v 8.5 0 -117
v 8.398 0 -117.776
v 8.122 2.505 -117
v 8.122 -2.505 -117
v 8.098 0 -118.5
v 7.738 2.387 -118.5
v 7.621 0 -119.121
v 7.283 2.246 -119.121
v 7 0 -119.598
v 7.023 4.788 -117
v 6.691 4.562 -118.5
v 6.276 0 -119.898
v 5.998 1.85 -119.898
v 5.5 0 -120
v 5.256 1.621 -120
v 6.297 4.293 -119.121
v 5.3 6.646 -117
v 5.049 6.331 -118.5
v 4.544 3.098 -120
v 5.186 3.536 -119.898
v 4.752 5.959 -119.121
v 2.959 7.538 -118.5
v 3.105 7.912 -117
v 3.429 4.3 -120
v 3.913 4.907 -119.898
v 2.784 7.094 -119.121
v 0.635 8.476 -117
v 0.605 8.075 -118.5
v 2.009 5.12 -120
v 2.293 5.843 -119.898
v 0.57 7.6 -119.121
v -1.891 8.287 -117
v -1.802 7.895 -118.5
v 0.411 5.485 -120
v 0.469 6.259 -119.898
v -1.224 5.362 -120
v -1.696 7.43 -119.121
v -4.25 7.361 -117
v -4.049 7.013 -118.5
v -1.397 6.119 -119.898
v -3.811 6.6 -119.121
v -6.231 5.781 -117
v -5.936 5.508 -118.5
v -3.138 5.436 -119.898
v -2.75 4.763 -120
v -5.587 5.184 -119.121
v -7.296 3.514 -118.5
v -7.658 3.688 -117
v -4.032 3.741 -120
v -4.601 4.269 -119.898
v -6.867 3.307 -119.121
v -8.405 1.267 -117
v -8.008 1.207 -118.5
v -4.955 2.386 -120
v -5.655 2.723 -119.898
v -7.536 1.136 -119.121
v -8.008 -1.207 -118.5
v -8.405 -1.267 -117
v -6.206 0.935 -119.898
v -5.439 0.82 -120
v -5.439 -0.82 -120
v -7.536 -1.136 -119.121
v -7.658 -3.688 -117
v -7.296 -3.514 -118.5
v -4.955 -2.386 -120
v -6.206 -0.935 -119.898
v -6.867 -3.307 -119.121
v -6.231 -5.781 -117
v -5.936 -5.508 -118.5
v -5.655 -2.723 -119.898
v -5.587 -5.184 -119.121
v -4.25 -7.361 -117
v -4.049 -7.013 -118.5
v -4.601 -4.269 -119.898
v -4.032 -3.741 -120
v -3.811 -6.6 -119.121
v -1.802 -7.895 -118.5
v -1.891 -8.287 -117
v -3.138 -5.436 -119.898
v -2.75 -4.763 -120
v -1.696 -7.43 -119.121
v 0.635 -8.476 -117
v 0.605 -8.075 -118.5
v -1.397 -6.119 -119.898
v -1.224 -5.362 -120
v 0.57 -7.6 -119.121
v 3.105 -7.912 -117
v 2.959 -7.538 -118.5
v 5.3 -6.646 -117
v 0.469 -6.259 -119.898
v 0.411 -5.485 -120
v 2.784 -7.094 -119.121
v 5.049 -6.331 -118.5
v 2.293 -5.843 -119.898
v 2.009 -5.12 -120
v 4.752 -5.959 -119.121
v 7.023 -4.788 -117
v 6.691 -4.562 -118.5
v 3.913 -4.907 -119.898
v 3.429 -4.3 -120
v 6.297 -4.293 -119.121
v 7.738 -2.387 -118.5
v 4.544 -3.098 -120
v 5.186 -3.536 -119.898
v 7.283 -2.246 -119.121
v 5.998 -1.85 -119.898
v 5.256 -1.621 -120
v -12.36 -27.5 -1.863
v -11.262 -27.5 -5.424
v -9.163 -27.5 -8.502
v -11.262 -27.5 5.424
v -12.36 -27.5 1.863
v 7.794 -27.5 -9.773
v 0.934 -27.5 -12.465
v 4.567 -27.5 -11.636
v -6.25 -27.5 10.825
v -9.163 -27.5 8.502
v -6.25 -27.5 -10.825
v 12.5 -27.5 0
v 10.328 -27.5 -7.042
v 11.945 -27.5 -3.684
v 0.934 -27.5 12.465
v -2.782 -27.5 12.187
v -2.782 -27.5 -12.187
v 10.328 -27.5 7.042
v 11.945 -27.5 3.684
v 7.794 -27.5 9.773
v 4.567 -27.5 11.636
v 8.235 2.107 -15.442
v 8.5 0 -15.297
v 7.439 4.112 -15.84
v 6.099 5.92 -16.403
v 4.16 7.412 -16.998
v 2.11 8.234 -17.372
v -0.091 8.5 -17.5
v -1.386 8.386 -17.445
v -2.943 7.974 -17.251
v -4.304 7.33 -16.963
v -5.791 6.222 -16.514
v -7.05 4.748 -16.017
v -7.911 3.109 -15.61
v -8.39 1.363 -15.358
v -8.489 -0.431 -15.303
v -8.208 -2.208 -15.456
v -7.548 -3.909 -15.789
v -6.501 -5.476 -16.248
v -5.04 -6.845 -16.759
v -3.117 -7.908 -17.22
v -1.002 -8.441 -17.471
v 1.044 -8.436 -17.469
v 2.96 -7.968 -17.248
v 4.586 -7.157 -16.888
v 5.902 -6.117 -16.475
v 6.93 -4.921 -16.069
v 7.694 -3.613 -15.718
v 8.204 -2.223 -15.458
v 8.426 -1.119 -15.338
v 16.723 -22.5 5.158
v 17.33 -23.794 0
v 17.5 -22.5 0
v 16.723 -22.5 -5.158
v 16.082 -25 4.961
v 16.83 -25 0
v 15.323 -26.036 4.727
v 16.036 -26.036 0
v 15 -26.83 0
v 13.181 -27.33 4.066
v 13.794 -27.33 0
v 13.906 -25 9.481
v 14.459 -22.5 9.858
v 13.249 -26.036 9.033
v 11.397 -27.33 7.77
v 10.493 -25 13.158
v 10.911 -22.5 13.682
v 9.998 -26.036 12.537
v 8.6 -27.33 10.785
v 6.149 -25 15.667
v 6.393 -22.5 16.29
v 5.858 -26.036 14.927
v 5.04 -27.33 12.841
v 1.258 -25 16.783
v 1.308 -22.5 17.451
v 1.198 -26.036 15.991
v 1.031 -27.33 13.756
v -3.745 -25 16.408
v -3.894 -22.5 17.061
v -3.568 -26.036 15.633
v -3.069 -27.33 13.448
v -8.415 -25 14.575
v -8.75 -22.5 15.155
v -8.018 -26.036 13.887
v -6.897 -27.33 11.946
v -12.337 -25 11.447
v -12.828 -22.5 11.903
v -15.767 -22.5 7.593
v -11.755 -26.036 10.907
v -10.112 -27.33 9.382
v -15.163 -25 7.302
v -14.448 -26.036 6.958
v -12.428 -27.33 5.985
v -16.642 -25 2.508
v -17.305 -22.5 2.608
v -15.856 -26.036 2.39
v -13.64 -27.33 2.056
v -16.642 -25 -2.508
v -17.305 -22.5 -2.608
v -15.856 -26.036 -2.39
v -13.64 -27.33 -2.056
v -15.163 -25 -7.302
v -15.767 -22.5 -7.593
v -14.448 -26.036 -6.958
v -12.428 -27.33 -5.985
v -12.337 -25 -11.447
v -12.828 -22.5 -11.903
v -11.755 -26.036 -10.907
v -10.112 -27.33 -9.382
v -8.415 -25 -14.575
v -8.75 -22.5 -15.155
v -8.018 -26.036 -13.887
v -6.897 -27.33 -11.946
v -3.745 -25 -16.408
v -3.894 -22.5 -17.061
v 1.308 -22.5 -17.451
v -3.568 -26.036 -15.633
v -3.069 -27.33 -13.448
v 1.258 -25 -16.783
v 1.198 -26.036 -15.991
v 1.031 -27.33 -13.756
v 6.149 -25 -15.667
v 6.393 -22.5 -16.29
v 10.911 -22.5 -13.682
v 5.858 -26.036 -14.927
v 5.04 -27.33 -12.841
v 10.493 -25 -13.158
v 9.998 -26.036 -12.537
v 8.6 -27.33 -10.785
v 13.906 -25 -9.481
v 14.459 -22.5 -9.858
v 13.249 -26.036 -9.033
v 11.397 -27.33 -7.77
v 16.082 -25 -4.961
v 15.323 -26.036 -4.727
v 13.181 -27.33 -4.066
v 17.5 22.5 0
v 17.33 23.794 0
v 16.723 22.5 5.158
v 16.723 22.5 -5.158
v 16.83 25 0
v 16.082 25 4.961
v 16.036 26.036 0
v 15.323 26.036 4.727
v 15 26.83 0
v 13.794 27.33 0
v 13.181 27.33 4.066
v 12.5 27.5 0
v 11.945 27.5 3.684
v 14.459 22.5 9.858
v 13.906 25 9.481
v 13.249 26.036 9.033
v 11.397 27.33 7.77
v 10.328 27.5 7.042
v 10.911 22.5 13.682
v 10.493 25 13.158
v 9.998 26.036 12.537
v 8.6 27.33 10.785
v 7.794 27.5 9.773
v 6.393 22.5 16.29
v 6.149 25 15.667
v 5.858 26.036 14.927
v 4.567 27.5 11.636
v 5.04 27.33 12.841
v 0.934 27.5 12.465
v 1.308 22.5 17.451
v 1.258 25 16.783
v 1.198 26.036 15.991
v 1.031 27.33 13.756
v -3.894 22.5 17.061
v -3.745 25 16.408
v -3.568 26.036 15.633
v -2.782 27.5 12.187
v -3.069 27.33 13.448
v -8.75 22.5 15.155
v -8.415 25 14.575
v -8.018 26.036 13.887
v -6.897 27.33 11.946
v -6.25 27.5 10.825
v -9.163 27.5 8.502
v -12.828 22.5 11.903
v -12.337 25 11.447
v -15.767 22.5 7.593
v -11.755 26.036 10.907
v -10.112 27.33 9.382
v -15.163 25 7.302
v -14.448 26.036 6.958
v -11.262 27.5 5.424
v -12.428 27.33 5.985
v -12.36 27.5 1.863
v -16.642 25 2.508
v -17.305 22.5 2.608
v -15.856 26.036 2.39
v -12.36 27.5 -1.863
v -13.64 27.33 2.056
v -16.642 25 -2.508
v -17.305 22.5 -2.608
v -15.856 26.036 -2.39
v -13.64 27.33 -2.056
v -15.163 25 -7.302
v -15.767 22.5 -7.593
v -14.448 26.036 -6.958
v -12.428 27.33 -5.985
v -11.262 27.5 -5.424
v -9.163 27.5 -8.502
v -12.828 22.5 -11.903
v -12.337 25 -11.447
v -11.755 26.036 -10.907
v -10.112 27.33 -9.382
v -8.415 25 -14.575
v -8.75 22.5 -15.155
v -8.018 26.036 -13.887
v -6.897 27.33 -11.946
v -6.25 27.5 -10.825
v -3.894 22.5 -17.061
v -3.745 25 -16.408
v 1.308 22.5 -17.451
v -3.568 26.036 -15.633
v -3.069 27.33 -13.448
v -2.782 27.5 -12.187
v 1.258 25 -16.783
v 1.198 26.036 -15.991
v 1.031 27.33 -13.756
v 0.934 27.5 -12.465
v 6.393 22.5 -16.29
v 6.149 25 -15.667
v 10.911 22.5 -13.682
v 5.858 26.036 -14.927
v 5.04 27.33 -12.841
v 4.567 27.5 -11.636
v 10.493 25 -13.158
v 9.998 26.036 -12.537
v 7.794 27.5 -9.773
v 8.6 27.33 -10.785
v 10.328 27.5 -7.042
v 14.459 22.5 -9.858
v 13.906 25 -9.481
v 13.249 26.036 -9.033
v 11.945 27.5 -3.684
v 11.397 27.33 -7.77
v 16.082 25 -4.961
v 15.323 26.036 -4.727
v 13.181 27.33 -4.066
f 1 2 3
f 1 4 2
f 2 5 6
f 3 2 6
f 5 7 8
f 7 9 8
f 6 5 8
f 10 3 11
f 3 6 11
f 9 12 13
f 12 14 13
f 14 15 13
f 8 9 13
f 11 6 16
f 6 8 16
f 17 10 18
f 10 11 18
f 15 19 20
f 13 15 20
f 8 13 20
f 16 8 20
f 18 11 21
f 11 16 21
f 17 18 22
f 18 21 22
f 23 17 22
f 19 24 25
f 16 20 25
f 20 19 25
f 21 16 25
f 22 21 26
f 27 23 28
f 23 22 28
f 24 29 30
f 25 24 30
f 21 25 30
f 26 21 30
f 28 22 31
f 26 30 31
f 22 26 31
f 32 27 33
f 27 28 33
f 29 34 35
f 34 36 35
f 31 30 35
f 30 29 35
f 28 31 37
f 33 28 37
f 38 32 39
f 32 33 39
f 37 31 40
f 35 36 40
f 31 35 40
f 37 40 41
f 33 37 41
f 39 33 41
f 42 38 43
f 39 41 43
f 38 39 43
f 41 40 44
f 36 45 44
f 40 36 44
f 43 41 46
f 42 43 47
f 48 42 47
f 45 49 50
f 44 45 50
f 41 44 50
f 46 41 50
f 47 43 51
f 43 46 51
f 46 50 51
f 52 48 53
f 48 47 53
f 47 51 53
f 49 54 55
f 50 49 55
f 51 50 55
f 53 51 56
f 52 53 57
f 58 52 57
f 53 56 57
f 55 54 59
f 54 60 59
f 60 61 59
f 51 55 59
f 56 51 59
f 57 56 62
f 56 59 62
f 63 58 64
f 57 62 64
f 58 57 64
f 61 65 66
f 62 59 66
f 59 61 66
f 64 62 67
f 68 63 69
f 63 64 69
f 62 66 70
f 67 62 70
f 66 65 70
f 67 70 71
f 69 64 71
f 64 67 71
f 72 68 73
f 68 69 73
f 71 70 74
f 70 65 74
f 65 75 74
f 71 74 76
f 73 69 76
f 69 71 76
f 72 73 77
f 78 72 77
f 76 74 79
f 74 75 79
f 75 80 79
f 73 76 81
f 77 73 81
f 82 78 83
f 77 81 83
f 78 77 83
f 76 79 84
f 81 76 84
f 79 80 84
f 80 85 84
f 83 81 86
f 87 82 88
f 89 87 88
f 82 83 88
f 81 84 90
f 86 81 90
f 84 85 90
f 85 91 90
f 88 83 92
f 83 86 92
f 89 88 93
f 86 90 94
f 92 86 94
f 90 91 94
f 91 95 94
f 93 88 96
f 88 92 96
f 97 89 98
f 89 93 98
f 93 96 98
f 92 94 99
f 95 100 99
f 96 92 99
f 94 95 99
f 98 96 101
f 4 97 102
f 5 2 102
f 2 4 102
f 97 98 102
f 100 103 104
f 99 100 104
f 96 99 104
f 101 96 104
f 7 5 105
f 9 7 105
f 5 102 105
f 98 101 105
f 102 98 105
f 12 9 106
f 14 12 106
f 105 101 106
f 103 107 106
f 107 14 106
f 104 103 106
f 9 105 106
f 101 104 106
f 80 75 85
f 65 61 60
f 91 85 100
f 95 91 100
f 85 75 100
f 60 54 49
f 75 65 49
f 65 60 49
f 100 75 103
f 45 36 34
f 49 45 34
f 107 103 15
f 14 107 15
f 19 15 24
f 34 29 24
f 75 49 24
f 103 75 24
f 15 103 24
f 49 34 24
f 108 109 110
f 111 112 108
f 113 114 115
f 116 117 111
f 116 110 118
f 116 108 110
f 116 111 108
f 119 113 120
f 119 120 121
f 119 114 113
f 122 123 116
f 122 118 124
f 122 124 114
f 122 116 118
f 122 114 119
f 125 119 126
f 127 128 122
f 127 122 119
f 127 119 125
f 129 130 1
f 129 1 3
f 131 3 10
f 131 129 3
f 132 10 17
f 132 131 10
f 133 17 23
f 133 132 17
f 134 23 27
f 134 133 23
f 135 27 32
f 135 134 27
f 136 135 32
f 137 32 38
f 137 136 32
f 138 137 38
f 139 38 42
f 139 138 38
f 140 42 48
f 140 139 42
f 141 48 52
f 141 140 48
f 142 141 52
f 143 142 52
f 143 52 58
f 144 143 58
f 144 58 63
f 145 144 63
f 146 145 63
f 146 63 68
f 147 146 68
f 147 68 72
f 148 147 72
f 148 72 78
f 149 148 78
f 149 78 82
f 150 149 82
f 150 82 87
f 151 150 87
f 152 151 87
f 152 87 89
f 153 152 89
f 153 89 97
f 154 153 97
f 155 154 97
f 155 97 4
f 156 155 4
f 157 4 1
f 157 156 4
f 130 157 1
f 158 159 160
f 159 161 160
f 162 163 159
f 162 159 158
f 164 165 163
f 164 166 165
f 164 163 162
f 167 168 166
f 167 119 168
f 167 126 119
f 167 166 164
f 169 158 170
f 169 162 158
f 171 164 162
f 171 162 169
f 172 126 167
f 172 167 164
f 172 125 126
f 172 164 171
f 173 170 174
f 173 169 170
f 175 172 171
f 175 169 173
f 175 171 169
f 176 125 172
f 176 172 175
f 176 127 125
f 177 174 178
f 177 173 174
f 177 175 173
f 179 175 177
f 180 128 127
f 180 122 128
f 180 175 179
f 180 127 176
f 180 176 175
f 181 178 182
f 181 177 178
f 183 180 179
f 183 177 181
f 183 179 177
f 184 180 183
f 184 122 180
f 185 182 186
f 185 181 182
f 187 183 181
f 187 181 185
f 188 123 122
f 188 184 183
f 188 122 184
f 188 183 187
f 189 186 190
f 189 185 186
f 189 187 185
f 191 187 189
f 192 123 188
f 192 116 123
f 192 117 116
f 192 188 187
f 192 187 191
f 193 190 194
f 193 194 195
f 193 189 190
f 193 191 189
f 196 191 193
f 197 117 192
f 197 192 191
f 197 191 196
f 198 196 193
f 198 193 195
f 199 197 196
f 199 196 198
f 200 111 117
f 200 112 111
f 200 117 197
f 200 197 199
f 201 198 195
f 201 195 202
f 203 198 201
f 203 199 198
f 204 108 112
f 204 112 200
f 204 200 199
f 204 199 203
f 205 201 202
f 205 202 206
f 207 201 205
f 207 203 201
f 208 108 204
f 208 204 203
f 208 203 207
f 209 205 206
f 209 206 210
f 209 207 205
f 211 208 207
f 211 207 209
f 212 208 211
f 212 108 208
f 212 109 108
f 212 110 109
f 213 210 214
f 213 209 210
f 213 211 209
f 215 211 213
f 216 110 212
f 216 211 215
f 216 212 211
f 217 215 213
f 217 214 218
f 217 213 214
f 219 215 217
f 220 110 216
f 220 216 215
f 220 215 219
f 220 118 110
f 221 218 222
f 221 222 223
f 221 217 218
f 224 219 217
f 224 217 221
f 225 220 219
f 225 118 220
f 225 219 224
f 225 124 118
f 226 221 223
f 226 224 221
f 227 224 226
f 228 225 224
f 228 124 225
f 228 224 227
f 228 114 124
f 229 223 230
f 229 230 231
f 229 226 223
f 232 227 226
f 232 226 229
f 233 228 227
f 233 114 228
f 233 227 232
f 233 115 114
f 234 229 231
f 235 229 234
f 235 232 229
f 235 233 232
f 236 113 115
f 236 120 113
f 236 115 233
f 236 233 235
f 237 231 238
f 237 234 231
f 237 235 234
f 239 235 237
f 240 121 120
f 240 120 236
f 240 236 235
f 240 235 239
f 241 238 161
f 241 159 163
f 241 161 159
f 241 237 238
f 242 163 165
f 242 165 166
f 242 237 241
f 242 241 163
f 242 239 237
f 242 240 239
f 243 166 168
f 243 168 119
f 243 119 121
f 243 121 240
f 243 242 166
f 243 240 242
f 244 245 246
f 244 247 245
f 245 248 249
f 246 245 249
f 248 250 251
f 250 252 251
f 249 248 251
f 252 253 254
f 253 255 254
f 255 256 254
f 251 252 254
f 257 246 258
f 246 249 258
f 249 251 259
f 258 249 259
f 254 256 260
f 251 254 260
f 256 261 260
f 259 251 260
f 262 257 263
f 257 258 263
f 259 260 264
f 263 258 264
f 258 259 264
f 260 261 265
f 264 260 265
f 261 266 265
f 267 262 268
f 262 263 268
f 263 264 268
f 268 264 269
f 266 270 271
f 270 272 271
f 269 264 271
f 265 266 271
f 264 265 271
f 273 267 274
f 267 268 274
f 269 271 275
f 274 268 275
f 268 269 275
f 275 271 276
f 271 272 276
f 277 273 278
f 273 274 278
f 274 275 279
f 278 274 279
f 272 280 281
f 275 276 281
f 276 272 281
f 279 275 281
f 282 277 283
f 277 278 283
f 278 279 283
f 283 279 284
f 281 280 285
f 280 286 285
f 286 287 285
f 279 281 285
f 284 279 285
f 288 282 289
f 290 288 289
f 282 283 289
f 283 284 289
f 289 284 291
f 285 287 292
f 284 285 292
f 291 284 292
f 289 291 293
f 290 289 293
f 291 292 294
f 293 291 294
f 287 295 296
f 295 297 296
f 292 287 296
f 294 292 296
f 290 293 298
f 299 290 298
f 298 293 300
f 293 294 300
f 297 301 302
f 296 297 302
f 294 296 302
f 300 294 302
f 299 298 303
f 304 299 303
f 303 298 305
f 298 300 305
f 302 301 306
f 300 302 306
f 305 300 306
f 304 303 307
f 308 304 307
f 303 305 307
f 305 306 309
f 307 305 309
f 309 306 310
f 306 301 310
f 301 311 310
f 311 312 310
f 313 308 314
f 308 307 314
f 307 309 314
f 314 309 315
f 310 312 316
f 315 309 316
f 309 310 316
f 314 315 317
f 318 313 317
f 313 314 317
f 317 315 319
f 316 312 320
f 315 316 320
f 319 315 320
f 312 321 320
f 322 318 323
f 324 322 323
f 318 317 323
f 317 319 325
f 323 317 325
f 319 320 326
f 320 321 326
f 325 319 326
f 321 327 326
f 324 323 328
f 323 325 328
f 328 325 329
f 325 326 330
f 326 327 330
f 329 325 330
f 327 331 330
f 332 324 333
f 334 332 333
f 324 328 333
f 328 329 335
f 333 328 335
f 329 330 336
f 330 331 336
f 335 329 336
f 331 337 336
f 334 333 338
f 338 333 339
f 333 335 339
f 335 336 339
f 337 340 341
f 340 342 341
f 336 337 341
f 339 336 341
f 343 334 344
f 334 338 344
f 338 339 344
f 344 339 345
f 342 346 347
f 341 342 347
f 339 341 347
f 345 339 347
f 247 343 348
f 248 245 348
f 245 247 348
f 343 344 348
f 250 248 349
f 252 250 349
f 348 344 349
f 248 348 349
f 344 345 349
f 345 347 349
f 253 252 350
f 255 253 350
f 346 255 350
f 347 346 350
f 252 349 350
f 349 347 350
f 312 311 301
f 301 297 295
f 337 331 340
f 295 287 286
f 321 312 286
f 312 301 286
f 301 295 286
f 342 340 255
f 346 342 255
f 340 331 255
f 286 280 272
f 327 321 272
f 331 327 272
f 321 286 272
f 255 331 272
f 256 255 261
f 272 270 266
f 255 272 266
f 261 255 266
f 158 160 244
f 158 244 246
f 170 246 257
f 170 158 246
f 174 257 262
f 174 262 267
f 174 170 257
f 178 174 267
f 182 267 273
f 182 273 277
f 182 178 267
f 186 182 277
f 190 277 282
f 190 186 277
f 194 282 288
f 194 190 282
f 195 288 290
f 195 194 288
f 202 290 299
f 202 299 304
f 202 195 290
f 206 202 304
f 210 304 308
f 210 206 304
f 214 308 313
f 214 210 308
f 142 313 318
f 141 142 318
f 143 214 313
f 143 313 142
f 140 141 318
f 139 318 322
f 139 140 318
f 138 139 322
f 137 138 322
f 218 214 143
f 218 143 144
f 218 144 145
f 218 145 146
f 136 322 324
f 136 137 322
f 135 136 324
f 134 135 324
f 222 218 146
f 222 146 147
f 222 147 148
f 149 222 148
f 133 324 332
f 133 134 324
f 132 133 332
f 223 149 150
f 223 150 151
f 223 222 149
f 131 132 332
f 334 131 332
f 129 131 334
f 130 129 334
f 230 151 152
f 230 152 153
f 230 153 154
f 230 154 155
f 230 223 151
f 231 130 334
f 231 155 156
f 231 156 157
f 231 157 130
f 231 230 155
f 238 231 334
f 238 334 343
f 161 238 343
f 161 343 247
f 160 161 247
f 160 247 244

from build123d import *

# Parameters (mm, degrees)
F0_R     = 17.5
F1_DEPTH = 27.5
F2_R     = 8.5
F3_DEPTH = 120
F4_R     = 5
F5_R     = 3


with BuildPart() as f1:
    # F0 (on Front) → F1 (new body, symmetric)
    with BuildSketch(Plane.XZ):
        Circle(F0_R)
    extrude(amount=F1_DEPTH, both=True)

    # F2 (on Top) → F3 (join)
    with BuildSketch(Plane.XY):
        Circle(F2_R)
    extrude(amount=-F3_DEPTH)

    # F4
    f4_edges = [f1.edges().sort_by_distance(p)[0] for p in [
        (-17.5, 27.5, 0),
        (-17.5, -27.5, 0),
    ]]
    fillet(f4_edges, radius=F4_R)

    # F5
    f5_edges = [f1.edges().sort_by_distance(p)[0] for p in [
        (-8.5, 0, -120),
    ]]
    fillet(f5_edges, radius=F5_R)


solid = f1.part
